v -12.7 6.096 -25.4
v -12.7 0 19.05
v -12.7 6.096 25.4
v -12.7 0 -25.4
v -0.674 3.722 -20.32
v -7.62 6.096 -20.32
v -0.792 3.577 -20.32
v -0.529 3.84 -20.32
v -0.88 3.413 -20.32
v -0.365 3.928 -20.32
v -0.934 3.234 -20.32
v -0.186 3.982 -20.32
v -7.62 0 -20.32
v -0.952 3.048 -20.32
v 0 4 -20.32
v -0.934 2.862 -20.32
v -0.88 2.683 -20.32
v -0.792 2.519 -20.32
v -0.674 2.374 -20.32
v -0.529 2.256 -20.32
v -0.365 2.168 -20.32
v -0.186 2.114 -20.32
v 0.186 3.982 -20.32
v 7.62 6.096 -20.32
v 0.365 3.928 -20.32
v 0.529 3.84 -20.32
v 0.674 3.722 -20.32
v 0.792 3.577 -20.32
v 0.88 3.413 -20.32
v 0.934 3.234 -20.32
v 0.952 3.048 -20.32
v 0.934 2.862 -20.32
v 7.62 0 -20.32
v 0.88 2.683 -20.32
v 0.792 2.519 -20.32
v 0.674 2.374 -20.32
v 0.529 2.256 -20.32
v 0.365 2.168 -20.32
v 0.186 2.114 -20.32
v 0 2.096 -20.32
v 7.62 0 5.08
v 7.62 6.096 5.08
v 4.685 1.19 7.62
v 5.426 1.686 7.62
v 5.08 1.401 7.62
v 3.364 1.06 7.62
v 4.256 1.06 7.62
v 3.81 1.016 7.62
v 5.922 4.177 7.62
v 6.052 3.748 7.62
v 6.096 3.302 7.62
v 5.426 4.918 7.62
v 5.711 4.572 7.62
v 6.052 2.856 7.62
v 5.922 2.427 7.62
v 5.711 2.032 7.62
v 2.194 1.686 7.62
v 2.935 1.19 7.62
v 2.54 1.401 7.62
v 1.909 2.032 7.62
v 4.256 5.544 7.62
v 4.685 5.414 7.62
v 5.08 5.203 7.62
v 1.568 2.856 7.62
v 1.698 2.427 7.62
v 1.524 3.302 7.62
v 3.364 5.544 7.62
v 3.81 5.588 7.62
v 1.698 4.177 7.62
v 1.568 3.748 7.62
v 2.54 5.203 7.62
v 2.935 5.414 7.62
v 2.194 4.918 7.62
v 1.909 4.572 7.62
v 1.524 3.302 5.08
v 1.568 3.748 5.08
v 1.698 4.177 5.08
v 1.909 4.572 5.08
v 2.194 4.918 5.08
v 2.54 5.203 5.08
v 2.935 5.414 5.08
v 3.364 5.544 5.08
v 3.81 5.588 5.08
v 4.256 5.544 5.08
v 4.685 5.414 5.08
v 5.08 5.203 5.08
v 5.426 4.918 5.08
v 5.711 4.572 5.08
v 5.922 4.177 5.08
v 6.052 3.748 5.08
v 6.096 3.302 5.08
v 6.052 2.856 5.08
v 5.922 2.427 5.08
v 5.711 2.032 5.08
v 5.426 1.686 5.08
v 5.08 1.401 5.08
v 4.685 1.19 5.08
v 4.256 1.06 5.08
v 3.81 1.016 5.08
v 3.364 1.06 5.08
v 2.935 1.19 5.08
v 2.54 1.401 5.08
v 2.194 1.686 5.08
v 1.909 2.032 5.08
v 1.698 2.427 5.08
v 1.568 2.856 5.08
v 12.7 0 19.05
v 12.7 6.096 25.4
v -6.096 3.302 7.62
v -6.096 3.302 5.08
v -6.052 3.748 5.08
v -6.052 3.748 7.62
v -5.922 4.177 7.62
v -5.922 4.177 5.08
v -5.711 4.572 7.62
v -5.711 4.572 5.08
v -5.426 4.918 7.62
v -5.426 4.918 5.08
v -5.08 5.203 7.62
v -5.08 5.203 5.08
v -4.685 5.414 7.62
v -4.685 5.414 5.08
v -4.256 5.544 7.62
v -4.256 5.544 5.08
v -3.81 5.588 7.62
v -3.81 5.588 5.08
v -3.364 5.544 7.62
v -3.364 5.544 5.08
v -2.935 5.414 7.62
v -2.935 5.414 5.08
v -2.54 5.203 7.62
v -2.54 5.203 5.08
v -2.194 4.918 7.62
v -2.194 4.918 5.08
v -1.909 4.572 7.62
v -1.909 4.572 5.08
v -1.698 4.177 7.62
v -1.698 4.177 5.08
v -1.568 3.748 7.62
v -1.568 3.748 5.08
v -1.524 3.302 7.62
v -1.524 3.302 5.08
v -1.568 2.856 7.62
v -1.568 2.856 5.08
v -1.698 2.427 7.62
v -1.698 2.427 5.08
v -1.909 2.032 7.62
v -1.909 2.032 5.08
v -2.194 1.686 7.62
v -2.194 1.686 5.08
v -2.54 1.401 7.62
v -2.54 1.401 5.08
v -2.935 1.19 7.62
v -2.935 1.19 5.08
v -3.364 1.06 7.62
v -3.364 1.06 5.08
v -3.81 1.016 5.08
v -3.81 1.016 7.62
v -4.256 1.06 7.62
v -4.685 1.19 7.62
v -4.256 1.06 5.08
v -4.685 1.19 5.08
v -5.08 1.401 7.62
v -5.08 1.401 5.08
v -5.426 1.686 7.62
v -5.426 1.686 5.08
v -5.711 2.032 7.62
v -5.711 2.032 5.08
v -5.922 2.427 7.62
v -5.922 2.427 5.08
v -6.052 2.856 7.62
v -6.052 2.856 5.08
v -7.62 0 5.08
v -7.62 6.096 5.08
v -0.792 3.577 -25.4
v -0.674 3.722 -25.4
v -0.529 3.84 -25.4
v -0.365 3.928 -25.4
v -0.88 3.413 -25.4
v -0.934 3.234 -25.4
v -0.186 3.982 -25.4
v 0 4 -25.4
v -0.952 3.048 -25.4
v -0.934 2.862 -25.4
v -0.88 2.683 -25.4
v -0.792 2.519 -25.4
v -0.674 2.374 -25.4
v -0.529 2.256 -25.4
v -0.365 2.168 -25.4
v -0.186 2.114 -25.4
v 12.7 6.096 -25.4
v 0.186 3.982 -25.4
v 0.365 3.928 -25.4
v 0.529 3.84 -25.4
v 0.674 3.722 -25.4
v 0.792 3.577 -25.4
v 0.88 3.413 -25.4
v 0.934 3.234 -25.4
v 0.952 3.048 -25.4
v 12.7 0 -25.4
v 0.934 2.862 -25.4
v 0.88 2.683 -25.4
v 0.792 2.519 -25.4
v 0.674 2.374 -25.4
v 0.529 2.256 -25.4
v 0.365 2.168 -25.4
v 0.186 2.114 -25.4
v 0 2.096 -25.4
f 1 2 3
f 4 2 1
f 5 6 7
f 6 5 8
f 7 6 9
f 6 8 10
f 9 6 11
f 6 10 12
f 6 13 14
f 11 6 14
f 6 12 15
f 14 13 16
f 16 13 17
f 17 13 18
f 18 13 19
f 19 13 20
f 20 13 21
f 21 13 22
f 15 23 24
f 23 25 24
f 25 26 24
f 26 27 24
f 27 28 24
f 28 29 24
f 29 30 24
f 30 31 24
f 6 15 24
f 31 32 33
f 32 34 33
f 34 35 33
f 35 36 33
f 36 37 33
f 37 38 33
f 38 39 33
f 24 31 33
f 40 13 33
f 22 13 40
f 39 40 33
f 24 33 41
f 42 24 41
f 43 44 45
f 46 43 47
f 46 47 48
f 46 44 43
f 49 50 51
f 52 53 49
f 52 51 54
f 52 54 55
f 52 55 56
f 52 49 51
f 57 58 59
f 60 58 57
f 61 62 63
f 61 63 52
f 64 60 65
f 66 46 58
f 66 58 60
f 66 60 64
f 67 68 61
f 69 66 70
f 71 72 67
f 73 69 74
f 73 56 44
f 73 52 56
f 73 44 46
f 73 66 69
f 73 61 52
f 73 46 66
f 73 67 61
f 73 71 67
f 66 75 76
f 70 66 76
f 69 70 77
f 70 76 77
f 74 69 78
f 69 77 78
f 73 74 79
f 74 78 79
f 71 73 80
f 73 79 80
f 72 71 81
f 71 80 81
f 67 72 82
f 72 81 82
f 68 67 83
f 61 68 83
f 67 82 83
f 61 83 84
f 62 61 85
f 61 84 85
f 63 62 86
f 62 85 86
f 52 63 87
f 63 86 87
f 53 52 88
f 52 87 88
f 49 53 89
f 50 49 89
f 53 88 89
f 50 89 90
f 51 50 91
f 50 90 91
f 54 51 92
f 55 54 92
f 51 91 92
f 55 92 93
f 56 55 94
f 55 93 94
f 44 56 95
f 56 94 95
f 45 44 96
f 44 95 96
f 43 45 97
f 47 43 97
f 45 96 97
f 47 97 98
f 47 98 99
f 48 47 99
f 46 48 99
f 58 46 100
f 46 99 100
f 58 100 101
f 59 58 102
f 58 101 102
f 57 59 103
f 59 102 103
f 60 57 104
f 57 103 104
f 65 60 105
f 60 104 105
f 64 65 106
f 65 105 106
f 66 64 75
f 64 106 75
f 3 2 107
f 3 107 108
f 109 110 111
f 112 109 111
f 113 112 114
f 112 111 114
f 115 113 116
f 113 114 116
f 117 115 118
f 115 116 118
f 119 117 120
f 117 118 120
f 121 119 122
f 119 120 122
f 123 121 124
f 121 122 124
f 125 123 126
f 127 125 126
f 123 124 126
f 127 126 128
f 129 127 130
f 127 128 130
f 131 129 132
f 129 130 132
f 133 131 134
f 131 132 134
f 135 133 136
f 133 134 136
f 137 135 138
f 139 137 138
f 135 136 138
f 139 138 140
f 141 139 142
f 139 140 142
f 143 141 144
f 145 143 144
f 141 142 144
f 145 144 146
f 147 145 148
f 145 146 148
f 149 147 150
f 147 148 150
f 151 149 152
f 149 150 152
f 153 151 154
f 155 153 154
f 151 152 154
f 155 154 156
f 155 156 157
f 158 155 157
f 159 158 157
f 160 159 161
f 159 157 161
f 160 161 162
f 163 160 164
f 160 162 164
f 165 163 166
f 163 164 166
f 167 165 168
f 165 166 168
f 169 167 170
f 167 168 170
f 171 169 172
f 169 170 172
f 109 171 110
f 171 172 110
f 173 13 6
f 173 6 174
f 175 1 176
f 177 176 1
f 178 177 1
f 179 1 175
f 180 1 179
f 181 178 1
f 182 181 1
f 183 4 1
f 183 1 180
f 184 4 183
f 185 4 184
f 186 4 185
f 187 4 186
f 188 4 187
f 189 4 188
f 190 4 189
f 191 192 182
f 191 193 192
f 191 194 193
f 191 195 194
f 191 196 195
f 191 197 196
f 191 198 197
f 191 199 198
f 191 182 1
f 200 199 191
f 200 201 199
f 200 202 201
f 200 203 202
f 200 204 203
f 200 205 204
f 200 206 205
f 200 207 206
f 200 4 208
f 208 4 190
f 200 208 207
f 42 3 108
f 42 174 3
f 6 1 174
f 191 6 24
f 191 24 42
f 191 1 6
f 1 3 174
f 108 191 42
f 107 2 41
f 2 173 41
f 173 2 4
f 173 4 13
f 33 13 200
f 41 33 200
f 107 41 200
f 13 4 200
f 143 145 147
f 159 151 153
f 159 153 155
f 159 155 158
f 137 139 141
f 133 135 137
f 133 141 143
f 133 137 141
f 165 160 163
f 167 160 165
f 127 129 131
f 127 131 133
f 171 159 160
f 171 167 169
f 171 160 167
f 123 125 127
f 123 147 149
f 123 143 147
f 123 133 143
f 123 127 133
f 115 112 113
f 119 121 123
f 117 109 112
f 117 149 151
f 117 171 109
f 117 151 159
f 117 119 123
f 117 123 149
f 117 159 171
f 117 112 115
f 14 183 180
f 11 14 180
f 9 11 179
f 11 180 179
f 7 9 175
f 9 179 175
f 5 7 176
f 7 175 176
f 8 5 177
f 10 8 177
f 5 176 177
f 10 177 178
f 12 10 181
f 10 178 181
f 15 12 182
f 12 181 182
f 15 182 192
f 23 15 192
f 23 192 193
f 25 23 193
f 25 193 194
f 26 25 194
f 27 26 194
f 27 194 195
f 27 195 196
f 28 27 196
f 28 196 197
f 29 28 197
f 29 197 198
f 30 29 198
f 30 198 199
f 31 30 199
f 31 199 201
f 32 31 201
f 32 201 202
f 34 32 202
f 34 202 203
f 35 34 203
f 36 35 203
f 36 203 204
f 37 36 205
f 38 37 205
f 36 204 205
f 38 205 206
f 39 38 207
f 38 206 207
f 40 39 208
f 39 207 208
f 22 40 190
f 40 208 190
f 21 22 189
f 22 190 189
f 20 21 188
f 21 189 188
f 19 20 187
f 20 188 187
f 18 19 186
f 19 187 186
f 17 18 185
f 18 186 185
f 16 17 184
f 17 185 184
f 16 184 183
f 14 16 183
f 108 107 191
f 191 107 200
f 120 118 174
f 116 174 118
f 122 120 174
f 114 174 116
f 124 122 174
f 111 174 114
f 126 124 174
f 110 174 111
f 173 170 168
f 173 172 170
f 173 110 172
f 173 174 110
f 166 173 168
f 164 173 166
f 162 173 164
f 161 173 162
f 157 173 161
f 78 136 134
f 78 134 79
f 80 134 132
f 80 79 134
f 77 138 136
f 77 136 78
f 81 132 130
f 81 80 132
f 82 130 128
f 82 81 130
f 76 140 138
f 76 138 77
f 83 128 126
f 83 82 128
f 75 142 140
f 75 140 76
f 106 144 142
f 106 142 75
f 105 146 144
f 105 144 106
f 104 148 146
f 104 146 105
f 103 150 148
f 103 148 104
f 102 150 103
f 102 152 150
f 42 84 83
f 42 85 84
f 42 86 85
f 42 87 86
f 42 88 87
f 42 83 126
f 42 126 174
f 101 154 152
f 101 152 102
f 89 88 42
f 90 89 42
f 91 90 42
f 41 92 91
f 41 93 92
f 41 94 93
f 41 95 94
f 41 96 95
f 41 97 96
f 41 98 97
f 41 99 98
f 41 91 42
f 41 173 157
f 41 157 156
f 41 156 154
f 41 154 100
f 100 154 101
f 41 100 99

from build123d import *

# Parameters (mm, degrees)
SKETCH1_W           = 25.4
SKETCH1_H           = 50.8
BOSS_EXTRUDE1_DEPTH = 6.096
CUT_EXTRUDE2_DEPTH  = 26.4
SKETCH4_W           = 15.24
SKETCH4_H           = 25.4
CUT_EXTRUDE3_DEPTH  = 7.096
SKETCH5_R           = 2.286
CUT_EXTRUDE4_DEPTH  = 2.54
CUT_EXTRUDE5_REACH  = 52.8
SKETCH6_R           = 0.9525


with BuildPart() as part:
    # Sketch1 → Boss-Extrude1 (new body)
    with BuildSketch(Plane(origin=(0, 0, 0), x_dir=(1, 0, 0), z_dir=(0, 1, 0))):
        Rectangle(SKETCH1_W, SKETCH1_H)
    extrude(amount=BOSS_EXTRUDE1_DEPTH)

    # Sketch3 → Cut-Extrude2 (cut, through all)
    with BuildSketch(Plane(origin=(12.7, 0, 0), x_dir=(0, 0, -1), z_dir=(1, 0, 0))):
        Polygon((-25.4, 6.096), (-25.4, 0), (-19.05, 0), align=None)
    extrude(amount=-CUT_EXTRUDE2_DEPTH, mode=Mode.SUBTRACT)

    # Sketch4 → Cut-Extrude3 (cut, through all)
    with BuildSketch(Plane.XZ):
        with Locations((0, -7.62)):
            Rectangle(SKETCH4_W, SKETCH4_H)
    extrude(amount=-CUT_EXTRUDE3_DEPTH, mode=Mode.SUBTRACT)

    # Sketch5 → Cut-Extrude4 (cut)
    with BuildSketch(Plane(origin=(0, 0, 5.08), x_dir=(-1, 0, 0), z_dir=(0, 0, -1))):
        with Locations((-3.81, 3.302)):
            Circle(SKETCH5_R)
        with Locations((3.81, 3.302)):
            Circle(SKETCH5_R)
    extrude(amount=-CUT_EXTRUDE4_DEPTH, mode=Mode.SUBTRACT)

    # Sketch6 → Cut-Extrude5 (cut, up to next)
    with BuildSketch(Plane(origin=(0, 0, -25.4), x_dir=(-1, 0, 0), z_dir=(0, 0, -1)), mode=Mode.PRIVATE) as cut_extrude5_sk1:
        with Locations((0, 3.048)):
            Circle(SKETCH6_R)
    cut_extrude5_tool1 = extrude(cut_extrude5_sk1.sketch, amount=-CUT_EXTRUDE5_REACH, mode=Mode.PRIVATE) & part.part
    add(cut_extrude5_tool1.solids().sort_by_distance((0, 3.048, -25.4))[0], mode=Mode.SUBTRACT)


solid = part.part
